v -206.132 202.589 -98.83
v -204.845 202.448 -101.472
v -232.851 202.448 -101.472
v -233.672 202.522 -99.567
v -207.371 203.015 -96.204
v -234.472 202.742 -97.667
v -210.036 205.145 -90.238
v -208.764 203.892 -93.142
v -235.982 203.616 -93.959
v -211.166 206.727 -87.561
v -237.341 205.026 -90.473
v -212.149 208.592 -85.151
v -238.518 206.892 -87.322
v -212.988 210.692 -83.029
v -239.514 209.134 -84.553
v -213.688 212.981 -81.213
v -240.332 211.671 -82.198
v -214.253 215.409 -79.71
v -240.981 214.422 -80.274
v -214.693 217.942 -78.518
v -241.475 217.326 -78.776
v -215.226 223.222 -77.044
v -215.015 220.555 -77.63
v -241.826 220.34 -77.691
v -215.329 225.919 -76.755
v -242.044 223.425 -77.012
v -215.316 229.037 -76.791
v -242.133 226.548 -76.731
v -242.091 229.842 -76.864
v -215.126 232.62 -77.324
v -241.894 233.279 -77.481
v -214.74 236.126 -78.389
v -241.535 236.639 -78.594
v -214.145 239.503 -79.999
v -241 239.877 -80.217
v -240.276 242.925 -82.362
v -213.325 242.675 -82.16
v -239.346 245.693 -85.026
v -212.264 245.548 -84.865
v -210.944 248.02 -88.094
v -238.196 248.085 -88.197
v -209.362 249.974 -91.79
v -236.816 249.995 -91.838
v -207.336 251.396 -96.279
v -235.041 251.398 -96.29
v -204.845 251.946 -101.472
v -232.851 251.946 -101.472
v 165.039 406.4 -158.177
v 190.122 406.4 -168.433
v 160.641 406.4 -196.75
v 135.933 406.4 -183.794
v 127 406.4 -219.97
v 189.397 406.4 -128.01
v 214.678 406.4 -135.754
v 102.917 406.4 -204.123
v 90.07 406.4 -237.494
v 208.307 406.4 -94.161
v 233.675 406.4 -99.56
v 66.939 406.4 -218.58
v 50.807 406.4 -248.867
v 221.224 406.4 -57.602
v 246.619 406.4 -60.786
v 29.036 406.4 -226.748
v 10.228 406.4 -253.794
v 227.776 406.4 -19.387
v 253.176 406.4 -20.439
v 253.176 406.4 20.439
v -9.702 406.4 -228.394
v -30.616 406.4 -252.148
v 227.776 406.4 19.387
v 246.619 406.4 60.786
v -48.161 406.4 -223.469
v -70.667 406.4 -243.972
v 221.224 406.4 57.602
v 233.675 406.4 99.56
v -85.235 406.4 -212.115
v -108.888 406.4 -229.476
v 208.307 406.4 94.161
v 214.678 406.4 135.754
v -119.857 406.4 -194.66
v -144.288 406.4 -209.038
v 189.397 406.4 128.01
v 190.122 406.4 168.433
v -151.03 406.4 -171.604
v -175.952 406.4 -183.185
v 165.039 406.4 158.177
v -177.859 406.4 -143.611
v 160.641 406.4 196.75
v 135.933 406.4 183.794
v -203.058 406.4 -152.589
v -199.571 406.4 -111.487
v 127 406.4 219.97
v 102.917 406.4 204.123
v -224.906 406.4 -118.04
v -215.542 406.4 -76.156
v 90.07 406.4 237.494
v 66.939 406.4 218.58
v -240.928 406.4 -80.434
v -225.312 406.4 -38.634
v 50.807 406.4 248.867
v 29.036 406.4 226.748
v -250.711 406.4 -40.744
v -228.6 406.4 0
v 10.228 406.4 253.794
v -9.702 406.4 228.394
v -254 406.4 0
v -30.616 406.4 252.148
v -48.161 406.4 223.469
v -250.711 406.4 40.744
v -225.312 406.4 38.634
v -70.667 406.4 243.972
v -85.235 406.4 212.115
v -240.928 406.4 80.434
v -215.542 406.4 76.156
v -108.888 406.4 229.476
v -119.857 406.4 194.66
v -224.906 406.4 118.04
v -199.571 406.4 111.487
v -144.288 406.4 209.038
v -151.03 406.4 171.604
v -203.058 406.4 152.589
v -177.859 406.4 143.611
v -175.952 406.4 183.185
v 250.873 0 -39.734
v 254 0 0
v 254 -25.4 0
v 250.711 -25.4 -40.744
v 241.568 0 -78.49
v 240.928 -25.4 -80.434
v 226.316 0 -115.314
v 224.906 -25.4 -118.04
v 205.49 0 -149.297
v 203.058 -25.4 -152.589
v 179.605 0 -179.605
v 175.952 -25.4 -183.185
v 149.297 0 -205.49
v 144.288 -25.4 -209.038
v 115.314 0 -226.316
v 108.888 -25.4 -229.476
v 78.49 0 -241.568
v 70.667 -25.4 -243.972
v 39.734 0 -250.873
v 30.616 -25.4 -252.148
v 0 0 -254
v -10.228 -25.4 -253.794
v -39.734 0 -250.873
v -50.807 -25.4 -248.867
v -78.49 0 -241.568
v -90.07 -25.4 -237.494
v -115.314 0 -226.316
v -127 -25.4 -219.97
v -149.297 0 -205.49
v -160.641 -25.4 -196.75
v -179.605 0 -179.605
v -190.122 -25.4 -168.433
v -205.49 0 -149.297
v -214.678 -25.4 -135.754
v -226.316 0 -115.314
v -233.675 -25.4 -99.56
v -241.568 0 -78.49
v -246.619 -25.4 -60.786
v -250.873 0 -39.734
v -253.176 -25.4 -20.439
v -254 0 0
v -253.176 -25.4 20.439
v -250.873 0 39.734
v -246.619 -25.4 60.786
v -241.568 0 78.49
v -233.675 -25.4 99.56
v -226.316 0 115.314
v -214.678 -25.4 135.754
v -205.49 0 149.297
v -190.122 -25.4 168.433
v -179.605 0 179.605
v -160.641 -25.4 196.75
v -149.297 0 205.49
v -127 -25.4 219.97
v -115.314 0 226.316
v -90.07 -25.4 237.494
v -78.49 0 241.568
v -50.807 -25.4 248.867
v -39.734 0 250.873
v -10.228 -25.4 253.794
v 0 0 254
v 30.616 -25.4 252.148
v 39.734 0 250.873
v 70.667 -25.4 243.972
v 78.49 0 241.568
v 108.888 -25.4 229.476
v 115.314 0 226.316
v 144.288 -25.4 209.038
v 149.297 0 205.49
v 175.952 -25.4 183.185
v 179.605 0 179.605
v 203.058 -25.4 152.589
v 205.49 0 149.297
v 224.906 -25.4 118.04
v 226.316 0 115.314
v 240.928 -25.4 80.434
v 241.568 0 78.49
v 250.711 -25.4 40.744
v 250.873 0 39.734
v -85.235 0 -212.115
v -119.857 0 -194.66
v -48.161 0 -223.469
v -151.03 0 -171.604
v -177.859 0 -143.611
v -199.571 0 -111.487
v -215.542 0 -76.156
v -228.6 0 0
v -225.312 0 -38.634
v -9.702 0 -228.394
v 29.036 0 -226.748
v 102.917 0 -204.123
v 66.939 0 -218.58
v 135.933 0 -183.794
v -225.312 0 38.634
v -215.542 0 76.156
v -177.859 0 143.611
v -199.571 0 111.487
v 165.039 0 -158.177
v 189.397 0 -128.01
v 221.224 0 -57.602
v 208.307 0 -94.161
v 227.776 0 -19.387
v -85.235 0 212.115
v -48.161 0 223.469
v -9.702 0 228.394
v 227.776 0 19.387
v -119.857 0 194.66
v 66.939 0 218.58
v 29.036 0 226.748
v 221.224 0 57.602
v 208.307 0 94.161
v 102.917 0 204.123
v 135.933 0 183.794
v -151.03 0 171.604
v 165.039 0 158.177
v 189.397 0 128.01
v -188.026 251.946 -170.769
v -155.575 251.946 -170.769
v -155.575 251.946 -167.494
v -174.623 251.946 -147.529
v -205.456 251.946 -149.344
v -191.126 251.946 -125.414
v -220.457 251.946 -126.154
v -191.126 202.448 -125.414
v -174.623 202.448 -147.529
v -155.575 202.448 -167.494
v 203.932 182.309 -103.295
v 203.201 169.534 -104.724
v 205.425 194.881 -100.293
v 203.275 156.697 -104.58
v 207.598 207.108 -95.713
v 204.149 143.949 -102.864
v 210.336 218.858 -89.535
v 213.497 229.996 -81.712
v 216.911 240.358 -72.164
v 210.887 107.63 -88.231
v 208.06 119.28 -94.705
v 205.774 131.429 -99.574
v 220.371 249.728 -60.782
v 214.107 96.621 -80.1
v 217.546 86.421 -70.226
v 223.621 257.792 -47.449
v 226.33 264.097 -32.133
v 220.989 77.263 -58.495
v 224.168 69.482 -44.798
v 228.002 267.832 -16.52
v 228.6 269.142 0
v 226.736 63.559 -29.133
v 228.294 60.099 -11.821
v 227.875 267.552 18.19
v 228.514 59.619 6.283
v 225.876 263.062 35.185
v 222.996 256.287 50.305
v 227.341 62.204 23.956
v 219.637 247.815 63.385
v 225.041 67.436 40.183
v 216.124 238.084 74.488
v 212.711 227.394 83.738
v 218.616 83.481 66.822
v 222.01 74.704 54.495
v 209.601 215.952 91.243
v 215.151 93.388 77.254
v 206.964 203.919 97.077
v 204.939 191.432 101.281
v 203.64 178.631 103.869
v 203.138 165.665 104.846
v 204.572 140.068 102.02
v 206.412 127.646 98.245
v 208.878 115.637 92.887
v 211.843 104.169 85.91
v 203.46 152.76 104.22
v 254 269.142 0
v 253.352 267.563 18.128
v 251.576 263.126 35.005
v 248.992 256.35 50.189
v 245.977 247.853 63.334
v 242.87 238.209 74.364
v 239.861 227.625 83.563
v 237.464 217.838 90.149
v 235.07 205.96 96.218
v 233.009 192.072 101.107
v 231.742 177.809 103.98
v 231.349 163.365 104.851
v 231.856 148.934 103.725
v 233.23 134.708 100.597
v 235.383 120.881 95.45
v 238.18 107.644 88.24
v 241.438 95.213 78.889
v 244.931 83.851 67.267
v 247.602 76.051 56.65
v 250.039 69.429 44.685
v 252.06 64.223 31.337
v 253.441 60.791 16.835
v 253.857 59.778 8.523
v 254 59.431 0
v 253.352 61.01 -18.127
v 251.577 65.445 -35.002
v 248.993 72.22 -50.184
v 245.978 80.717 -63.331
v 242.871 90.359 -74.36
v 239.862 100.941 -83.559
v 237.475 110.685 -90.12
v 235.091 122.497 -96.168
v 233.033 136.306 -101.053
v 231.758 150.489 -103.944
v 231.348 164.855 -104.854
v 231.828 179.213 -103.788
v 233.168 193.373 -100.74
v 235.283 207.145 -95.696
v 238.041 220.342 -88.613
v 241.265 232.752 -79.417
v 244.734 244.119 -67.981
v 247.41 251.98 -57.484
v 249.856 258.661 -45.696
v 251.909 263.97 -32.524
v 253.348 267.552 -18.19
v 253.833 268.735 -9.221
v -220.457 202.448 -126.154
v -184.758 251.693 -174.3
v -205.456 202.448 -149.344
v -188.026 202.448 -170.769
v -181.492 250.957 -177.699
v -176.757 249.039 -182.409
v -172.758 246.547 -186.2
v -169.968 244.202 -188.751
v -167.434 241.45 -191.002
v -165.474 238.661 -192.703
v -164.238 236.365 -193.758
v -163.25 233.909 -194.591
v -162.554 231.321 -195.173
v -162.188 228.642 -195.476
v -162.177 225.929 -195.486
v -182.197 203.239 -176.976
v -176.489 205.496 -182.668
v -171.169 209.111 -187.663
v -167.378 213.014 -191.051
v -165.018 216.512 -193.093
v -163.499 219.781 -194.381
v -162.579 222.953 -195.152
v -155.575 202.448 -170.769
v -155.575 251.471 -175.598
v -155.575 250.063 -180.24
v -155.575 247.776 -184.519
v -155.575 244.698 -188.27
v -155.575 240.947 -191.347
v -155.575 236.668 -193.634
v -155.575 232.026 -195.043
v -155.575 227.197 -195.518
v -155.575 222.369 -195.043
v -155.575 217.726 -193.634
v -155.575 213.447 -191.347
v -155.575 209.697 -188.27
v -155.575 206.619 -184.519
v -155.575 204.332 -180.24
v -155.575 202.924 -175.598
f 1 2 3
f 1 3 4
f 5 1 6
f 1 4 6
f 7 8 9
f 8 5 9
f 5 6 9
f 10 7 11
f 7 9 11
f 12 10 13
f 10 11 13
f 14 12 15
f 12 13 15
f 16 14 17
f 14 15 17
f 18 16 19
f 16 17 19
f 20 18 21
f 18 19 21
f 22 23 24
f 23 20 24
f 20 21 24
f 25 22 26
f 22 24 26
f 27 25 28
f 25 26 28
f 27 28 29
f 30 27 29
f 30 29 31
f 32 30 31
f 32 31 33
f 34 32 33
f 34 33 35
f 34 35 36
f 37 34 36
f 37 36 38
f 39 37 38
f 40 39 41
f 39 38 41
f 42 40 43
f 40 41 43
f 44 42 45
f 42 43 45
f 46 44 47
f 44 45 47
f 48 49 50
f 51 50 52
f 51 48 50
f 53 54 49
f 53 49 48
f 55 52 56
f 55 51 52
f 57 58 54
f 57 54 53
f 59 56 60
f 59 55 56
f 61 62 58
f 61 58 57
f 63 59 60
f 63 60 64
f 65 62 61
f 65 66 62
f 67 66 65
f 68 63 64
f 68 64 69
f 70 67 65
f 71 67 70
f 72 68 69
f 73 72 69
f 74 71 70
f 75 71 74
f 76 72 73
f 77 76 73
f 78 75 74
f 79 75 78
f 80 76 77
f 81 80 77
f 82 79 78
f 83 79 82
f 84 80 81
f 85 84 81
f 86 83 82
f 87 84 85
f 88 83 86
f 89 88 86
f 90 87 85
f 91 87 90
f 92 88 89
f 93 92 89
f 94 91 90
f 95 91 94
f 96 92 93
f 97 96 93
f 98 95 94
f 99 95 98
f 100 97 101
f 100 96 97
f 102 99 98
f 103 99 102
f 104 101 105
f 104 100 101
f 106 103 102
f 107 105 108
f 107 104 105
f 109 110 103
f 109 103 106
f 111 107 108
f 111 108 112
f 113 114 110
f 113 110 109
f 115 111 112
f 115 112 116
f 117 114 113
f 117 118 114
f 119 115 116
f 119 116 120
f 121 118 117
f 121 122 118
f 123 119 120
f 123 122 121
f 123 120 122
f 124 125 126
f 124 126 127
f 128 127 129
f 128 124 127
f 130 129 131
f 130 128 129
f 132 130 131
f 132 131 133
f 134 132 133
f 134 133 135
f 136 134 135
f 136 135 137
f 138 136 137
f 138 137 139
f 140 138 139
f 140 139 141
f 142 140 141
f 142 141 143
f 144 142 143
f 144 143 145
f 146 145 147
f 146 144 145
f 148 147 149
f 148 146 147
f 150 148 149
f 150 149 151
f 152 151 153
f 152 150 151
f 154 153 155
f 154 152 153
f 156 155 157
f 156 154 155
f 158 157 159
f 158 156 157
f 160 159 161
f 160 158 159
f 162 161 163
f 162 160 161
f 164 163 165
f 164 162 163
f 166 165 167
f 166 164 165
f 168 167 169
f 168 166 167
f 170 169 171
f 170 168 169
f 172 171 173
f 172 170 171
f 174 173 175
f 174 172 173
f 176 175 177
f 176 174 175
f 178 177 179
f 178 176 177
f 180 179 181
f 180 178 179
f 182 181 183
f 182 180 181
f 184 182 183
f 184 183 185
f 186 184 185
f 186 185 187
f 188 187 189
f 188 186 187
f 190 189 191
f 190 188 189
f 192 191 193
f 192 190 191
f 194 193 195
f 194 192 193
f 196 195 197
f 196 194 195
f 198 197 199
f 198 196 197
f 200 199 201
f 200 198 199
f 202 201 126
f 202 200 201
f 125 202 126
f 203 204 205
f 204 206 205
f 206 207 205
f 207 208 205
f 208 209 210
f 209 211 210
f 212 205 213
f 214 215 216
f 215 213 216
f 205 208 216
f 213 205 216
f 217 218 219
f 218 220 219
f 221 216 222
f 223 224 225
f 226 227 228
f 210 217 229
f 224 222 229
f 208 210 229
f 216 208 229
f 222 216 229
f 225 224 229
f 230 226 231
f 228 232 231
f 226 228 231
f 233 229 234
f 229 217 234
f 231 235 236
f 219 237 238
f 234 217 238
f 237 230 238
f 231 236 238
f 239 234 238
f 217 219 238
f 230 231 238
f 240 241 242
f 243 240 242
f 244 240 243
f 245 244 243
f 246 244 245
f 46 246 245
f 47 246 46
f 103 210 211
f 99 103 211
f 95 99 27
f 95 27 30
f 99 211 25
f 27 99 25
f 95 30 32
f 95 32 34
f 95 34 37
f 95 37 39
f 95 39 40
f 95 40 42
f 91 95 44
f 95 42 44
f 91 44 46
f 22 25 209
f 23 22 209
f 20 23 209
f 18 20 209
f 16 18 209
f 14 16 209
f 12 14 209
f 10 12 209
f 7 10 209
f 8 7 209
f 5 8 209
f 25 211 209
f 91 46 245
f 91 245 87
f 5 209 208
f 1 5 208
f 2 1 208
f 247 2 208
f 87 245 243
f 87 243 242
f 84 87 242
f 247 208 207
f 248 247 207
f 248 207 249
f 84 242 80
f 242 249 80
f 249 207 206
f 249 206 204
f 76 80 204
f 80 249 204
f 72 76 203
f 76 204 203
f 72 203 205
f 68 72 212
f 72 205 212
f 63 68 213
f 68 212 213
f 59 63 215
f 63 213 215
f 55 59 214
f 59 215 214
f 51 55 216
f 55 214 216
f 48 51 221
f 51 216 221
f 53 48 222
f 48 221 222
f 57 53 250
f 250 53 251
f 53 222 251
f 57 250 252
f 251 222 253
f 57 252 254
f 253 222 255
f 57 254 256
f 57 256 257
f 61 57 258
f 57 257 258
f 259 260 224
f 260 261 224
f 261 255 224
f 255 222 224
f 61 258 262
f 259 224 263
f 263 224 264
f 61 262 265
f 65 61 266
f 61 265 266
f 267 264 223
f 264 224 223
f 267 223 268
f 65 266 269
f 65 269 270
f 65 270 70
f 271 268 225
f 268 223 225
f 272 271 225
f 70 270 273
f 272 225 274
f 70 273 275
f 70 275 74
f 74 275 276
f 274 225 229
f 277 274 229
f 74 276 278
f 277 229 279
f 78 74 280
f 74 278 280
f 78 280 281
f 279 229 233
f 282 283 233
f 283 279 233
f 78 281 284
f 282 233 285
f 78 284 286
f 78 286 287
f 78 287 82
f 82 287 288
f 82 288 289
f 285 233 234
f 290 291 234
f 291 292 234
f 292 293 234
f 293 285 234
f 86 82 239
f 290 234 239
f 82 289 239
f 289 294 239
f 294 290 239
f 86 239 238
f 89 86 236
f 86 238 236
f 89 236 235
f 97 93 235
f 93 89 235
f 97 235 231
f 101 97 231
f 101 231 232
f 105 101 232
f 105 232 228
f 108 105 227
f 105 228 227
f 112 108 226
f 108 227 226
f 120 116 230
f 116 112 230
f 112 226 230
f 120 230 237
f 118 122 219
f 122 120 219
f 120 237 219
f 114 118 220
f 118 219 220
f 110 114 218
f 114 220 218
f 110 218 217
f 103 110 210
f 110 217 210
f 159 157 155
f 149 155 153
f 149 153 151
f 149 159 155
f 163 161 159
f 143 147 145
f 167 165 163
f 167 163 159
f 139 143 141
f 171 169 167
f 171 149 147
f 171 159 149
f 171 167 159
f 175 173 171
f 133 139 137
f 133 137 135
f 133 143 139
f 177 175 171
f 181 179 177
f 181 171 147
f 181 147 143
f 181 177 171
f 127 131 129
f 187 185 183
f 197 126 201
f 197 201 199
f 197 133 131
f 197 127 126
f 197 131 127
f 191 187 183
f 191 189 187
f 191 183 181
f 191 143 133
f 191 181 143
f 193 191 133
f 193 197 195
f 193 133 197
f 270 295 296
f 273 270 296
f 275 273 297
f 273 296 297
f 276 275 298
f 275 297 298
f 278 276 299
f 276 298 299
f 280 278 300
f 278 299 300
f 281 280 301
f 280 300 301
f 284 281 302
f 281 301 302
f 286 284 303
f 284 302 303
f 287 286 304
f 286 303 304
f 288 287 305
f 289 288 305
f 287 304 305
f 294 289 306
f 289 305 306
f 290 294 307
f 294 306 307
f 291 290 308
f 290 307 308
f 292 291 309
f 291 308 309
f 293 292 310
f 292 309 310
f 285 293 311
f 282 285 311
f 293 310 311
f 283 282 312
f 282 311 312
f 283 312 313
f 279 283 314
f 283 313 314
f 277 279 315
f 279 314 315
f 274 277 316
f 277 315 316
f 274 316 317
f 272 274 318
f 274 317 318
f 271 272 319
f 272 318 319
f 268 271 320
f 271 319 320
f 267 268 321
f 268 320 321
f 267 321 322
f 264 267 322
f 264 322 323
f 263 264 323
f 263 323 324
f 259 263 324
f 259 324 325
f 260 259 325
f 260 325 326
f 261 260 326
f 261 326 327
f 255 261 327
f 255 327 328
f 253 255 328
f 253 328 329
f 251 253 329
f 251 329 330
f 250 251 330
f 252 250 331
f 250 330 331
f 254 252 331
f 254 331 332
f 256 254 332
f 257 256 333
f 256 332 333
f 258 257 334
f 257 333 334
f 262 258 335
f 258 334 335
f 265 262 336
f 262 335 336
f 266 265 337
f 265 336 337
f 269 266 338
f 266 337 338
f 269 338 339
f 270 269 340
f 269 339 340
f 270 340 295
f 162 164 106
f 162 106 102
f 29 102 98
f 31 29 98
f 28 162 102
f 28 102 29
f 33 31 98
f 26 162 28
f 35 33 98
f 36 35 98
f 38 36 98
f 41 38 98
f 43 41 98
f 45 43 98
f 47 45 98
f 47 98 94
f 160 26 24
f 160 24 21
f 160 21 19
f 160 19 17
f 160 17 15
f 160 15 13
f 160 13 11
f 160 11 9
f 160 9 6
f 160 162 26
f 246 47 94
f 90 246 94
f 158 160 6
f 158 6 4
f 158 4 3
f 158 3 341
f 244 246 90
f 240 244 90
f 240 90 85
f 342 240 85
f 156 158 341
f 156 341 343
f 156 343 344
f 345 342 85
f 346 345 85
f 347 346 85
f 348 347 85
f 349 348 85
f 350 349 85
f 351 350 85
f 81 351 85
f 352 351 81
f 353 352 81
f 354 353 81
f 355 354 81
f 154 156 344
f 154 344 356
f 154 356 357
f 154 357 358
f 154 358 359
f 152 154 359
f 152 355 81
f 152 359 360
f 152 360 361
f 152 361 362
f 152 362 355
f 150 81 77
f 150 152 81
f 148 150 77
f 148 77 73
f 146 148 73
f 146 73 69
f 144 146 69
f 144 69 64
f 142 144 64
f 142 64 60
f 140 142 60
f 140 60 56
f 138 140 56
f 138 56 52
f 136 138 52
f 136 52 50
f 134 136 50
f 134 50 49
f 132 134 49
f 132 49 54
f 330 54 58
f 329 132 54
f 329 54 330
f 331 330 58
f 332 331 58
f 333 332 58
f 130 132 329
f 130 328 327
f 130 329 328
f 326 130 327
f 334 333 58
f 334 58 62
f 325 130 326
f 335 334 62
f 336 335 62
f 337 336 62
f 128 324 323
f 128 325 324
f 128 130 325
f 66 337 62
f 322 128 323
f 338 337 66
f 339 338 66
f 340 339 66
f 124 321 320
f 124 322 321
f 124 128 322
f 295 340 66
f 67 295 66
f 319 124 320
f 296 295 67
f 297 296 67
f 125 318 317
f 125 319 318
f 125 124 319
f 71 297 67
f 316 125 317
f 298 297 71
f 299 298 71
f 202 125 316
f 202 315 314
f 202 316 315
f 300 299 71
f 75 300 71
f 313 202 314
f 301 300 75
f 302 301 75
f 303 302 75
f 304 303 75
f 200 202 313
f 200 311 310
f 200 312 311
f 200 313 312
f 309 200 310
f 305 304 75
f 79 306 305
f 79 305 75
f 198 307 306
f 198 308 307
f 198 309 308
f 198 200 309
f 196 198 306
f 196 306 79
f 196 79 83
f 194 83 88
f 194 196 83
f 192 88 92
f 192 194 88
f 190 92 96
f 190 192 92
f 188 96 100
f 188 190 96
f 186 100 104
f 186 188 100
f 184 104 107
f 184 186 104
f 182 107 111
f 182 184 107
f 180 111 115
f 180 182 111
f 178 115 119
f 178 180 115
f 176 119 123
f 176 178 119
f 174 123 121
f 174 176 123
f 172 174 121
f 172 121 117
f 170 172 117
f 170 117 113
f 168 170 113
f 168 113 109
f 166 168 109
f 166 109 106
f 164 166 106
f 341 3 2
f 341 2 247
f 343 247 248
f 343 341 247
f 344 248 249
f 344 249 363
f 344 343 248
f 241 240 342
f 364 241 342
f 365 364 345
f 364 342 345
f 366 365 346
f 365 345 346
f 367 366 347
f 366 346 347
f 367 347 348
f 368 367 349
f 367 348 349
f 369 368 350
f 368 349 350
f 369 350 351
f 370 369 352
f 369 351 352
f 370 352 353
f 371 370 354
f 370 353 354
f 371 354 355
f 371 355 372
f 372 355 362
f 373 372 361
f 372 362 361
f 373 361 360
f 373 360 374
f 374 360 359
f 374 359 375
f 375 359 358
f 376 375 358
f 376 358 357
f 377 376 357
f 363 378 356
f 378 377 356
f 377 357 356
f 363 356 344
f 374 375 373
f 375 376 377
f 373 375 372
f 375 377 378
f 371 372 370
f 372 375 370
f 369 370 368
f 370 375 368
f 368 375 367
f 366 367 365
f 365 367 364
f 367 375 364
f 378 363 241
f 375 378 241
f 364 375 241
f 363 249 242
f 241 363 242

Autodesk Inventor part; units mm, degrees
ref_plane "XZ Plane" through (0, 0, 0) normal (0, 1, 0) x (-1, 0, 0)
ref_plane "XY Plane" through (0, 0, 0) normal (0, 0, 1) x (1, 0, 0)
sketch "Sketch1" plane through (0, 0, 0) normal (0, 1, 0) x (-1, 0, 0)
  circle A0 centre (0, 0) radius 228.6
  circle A1 centre (0, 0) radius 254
  dimension "d0" = 457.2
  dimension "d1" = 508
extrude "Extrusion1" add sketch "Sketch1" along normal blind 406.4
sketch "Sketch2" plane through (0, 0, 0) normal (0, -1, 0) x (1, 0, 0)
  circle A0 centre (0, 0) radius 254
extrude "Extrusion2" add sketch "Sketch2" along normal blind 25.4
ref_plane "Work Plane1" through (-254, 0, 0) normal (1, 0, 0) x (0, 1, 0)
sketch "Sketch3" plane through (-254, 0, 0) normal (1, 0, 0) x (0, 1, 0)
  line L0 (227.1973, -170.7692) -> (227.1973, -101.4716) construction
  line L1 (251.9465, -170.7692) -> (251.9465, -101.4716)
  line L2 (202.4481, -101.4716) -> (202.4481, -170.7692)
  arc A0 (202.4481, -170.7692) -> (251.9465, -170.7692) centre (227.1973, -170.7692) ccw
  arc A1 (251.9465, -101.4716) -> (202.4481, -101.4716) centre (227.1973, -101.4716) ccw
  point P0 (0, 0)
  point P1 (227.1973, -136.1204)
extrude "Extrusion3" cut sketch "Sketch3" along normal blind 98.425
ref_plane "Plane for hole making" through (254, 0, 0) normal (1, 0, 0) x (0, 1, 0)
sketch "Sketch4" plane through (254, 0, 0) normal (1, 0, 0) x (0, 1, 0)
  point P0 (0, 0)
sketch "Sketch5" plane through (254, 0, 0) normal (1, 0, 0) x (0, 1, 0)
  circle A0 centre (164.2862, 0) radius 104.8554
  point P0 (0, 0)
extrude "Extrusion4" cut sketch "Sketch5" against normal blind 76.2
